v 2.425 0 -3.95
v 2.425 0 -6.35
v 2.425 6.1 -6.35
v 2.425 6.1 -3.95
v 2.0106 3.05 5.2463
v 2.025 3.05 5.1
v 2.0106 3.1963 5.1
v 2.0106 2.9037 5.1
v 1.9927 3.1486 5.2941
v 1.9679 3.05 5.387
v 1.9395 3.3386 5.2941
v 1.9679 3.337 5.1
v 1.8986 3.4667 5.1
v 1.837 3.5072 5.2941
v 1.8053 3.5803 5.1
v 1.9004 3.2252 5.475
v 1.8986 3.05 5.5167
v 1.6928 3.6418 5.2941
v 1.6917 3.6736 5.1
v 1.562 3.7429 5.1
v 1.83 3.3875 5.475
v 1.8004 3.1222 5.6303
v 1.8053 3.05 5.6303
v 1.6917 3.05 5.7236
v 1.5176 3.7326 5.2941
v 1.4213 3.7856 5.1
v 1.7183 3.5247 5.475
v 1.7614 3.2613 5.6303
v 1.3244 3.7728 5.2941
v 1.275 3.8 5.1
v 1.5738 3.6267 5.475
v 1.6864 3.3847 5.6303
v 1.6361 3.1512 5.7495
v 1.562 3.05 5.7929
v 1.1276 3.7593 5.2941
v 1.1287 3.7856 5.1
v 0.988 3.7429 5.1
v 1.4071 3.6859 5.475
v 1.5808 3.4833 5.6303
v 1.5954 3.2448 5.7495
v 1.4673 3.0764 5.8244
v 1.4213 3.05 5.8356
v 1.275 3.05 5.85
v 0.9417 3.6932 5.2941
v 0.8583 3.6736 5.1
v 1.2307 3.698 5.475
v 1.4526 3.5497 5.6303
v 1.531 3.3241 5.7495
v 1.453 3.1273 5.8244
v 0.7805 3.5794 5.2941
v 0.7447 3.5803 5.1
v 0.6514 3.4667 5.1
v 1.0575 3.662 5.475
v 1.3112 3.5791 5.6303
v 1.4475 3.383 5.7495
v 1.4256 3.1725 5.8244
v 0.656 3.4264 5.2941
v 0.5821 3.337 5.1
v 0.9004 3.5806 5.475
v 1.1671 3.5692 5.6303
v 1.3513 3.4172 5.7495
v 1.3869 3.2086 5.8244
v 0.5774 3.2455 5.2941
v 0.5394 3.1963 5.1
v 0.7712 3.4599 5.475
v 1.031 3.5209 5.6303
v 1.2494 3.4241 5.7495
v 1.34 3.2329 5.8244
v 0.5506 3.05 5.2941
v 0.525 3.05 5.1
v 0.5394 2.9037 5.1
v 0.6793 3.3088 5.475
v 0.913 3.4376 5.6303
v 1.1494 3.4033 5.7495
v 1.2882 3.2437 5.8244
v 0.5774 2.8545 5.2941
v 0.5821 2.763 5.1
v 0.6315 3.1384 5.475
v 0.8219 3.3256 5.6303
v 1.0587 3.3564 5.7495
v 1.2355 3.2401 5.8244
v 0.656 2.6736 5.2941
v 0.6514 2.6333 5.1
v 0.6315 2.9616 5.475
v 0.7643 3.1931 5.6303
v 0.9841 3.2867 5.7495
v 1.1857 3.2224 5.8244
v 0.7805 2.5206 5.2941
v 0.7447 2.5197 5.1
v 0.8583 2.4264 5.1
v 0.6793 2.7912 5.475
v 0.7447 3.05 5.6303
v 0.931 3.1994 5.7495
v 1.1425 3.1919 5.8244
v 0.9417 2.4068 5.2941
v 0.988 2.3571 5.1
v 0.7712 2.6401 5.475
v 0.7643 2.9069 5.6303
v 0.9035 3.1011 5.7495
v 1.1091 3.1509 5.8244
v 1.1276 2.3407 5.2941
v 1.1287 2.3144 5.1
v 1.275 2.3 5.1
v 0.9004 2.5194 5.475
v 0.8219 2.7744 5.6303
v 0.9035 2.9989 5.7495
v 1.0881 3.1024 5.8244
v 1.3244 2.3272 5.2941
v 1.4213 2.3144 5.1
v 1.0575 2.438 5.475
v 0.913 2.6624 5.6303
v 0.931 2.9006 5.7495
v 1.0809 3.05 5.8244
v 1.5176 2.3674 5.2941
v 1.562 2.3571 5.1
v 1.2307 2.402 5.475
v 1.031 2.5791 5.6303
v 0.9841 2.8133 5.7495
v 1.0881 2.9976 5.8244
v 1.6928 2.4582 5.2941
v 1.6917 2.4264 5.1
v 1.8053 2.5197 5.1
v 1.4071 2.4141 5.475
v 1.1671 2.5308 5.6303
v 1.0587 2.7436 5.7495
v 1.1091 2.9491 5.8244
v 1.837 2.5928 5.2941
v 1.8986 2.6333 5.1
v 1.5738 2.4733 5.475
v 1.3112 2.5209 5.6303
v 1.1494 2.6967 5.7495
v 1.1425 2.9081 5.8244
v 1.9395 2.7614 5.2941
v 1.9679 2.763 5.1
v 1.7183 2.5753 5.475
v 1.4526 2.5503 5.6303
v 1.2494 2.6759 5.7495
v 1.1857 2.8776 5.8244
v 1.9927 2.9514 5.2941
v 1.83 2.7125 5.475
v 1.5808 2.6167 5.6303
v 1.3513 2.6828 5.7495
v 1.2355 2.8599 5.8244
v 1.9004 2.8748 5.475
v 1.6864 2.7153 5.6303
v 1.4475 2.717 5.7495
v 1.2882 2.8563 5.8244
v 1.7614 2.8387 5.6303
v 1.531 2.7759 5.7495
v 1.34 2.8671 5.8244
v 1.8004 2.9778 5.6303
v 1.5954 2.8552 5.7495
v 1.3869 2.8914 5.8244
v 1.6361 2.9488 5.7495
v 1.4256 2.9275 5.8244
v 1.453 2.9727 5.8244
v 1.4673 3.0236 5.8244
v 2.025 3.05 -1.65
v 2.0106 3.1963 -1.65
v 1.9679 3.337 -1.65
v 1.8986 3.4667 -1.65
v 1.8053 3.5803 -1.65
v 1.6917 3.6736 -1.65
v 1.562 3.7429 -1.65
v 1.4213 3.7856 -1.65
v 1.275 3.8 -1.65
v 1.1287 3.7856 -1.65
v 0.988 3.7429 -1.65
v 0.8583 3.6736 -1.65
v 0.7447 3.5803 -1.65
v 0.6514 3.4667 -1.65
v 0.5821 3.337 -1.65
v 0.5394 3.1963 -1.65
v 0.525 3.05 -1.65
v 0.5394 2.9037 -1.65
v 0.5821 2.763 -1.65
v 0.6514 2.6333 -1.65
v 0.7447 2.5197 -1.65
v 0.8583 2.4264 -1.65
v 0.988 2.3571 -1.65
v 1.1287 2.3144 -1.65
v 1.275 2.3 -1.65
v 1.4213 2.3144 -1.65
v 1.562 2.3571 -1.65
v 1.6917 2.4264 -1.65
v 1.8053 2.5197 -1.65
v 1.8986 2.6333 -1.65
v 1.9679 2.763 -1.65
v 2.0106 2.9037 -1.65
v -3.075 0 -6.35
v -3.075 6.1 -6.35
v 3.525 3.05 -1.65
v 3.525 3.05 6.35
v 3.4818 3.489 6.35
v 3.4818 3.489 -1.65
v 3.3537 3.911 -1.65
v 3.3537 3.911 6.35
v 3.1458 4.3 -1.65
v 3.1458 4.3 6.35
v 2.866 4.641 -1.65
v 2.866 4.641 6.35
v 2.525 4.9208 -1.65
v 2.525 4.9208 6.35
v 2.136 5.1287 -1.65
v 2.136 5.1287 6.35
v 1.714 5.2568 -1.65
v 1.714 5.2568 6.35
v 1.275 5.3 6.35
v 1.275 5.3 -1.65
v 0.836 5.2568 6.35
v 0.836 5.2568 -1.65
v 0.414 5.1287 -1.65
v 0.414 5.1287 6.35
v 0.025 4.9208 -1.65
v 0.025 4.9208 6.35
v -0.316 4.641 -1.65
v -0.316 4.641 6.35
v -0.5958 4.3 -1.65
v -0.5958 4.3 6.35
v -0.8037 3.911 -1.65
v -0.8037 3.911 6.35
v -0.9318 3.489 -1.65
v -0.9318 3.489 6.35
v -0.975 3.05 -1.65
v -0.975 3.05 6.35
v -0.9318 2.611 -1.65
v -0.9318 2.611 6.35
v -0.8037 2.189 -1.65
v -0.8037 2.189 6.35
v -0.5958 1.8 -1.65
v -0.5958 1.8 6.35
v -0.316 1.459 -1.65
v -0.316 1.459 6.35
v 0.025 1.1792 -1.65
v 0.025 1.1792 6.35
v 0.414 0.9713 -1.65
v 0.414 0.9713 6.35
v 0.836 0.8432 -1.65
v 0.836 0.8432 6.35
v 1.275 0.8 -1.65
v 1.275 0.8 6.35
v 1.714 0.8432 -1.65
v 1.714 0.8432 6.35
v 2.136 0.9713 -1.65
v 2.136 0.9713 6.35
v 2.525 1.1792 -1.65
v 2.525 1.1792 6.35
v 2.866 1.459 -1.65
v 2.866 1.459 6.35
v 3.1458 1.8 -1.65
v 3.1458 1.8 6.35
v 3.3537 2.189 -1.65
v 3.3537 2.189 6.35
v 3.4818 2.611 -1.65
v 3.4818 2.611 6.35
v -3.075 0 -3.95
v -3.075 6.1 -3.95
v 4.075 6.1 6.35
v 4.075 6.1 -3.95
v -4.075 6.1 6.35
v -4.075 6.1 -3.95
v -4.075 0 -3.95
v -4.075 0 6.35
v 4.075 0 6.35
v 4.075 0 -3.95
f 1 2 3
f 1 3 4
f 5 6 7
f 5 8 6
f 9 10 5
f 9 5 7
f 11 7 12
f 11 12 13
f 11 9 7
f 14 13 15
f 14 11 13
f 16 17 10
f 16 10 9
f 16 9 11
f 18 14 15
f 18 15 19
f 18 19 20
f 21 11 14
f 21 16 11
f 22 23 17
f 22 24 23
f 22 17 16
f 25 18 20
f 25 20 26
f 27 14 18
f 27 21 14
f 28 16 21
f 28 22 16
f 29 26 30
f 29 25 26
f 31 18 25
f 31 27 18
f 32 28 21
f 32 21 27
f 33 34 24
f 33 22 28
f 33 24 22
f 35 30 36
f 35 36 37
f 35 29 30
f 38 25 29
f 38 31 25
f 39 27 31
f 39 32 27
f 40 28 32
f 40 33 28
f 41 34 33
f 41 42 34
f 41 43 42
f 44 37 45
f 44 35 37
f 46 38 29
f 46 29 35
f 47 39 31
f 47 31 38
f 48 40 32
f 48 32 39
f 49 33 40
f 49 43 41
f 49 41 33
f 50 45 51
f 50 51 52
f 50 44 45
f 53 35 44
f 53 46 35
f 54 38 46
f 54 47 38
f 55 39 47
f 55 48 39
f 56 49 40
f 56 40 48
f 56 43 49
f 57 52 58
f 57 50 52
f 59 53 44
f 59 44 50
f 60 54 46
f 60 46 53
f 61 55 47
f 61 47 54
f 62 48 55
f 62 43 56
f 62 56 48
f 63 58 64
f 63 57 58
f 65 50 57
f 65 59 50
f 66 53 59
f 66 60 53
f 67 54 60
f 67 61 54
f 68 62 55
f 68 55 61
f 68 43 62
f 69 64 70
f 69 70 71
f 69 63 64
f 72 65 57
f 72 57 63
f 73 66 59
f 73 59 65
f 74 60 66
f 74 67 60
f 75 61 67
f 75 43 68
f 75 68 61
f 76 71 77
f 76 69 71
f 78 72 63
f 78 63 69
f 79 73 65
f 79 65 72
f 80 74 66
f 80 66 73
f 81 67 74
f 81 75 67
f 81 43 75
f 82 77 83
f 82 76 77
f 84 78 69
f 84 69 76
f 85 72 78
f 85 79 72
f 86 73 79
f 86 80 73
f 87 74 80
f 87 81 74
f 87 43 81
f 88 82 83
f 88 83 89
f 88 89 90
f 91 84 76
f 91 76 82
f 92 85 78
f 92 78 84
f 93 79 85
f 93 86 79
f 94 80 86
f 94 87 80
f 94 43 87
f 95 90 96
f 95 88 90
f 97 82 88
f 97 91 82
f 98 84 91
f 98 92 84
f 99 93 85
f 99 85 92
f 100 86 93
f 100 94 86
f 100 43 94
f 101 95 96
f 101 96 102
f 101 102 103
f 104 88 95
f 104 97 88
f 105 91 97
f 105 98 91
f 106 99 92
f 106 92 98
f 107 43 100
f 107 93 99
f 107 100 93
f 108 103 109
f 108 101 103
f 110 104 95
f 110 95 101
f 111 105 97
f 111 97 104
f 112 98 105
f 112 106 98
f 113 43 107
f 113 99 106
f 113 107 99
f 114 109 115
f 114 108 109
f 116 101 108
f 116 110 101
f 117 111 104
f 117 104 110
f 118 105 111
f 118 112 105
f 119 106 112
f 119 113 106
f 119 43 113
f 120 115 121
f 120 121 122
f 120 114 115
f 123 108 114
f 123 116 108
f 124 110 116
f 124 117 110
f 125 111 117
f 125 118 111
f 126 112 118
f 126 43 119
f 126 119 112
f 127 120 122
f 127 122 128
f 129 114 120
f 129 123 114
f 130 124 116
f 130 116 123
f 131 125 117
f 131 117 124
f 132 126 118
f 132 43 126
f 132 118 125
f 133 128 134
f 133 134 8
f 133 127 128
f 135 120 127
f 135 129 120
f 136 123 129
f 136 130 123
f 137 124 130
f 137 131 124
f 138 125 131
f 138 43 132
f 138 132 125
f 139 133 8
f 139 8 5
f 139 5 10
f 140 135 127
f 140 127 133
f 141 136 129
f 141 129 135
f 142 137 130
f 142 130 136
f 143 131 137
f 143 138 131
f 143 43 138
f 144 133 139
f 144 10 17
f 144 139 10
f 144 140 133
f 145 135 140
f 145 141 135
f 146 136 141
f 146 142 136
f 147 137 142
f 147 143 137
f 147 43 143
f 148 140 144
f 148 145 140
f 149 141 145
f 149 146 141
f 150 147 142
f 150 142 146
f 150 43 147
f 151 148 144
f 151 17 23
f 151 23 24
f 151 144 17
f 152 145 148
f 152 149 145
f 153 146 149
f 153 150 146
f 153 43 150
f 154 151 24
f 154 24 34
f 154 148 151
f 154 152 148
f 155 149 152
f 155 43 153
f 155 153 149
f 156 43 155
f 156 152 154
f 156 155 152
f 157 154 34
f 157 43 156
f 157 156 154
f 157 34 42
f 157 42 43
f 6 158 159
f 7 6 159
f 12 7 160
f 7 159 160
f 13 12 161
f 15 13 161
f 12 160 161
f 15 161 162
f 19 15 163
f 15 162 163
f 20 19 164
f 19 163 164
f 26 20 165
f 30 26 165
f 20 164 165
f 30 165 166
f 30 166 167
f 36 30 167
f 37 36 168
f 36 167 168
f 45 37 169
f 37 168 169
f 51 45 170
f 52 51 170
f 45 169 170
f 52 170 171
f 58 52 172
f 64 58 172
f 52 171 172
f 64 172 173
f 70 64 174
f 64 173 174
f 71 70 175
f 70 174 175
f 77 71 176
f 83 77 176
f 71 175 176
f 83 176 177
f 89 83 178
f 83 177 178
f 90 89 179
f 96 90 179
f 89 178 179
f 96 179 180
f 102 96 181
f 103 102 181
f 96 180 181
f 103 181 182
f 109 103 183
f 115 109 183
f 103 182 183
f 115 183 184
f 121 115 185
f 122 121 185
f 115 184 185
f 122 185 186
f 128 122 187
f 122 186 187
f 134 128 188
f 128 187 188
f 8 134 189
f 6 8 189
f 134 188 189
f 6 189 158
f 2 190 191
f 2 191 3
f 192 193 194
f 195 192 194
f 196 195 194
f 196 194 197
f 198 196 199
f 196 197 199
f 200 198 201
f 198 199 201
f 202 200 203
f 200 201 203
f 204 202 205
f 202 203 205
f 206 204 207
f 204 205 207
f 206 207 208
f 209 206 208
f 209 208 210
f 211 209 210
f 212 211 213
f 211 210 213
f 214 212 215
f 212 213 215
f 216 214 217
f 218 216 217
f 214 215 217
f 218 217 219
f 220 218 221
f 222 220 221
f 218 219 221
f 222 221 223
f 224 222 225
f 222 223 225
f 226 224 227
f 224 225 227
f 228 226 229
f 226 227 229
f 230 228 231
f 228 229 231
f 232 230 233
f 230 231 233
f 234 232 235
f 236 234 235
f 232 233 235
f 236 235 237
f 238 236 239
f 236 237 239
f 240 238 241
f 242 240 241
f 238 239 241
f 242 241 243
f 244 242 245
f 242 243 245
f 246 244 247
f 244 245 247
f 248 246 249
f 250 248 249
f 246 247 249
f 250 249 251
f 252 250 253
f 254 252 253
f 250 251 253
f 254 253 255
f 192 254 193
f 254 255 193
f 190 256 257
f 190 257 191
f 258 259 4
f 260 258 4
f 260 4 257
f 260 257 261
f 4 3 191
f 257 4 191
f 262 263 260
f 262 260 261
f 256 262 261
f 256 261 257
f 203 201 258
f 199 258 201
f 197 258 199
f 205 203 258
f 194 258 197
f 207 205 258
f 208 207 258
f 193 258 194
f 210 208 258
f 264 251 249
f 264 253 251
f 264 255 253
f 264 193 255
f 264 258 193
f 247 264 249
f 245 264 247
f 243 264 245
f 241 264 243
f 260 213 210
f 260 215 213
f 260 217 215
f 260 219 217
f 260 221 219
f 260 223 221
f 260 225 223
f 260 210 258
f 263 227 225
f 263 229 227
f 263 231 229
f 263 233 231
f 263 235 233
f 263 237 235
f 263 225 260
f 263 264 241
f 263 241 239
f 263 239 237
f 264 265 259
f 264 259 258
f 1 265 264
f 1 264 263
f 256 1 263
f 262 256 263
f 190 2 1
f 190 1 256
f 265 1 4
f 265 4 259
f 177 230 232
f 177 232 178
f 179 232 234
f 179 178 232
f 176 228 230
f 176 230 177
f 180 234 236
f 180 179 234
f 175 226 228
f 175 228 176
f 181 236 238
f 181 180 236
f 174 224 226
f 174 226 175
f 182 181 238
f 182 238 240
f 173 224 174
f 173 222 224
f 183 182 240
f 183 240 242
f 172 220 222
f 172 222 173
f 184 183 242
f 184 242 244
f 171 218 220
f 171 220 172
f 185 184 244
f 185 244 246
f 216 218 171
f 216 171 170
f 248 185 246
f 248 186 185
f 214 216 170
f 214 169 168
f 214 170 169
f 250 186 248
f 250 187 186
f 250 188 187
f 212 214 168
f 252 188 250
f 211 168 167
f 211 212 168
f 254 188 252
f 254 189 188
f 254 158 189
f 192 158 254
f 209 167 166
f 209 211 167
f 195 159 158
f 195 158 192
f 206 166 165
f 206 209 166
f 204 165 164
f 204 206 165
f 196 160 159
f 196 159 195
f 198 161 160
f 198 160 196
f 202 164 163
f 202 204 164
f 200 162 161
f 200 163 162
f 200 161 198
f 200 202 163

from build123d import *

# Parameters (mm, degrees)
EXTRUDE_1_DEPTH     = 6.1
SKETCH_2_R          = 2.25
CUT_EXTRUDE_1_DEPTH = 8
SKETCH_3_R          = 0.75
EXTRUDE_2_DEPTH     = 7.5
FILLET_1_R          = 0.75


with BuildPart() as part:
    # Эскиз1 → Бобышка-Вытянуть1 (new body)
    with BuildSketch(Plane(origin=(0, 0, 0), x_dir=(1, 0, 0), z_dir=(0, 1, 0))):
        Polygon((-4.075, 3.95), (-3.075, 3.95), (-3.075, 6.35), (2.425, 6.35), (2.425, 3.95), (4.075, 3.95), (4.075, -6.35), (-4.075, -6.35), align=None)
    extrude(amount=EXTRUDE_1_DEPTH)

    # Эскиз2 → Вырез-Вытянуть1 (cut)
    with BuildSketch(Plane.XY.offset(6.35)):
        with Locations((1.275, 3.05)):
            Circle(SKETCH_2_R)
    extrude(amount=-CUT_EXTRUDE_1_DEPTH, mode=Mode.SUBTRACT)

    # Эскиз3 → Бобышка-Вытянуть2 (add)
    with BuildSketch(Plane.XY.offset(-1.65)):
        with Locations((1.275, 3.05)):
            Circle(SKETCH_3_R)
    extrude(amount=EXTRUDE_2_DEPTH)

    # Скругление1
    fillet_1_edges = [part.edges().sort_by_distance(p)[0] for p in [
        (0.525, 3.05, 5.85),
    ]]
    fillet(fillet_1_edges, radius=FILLET_1_R)


solid = part.part
